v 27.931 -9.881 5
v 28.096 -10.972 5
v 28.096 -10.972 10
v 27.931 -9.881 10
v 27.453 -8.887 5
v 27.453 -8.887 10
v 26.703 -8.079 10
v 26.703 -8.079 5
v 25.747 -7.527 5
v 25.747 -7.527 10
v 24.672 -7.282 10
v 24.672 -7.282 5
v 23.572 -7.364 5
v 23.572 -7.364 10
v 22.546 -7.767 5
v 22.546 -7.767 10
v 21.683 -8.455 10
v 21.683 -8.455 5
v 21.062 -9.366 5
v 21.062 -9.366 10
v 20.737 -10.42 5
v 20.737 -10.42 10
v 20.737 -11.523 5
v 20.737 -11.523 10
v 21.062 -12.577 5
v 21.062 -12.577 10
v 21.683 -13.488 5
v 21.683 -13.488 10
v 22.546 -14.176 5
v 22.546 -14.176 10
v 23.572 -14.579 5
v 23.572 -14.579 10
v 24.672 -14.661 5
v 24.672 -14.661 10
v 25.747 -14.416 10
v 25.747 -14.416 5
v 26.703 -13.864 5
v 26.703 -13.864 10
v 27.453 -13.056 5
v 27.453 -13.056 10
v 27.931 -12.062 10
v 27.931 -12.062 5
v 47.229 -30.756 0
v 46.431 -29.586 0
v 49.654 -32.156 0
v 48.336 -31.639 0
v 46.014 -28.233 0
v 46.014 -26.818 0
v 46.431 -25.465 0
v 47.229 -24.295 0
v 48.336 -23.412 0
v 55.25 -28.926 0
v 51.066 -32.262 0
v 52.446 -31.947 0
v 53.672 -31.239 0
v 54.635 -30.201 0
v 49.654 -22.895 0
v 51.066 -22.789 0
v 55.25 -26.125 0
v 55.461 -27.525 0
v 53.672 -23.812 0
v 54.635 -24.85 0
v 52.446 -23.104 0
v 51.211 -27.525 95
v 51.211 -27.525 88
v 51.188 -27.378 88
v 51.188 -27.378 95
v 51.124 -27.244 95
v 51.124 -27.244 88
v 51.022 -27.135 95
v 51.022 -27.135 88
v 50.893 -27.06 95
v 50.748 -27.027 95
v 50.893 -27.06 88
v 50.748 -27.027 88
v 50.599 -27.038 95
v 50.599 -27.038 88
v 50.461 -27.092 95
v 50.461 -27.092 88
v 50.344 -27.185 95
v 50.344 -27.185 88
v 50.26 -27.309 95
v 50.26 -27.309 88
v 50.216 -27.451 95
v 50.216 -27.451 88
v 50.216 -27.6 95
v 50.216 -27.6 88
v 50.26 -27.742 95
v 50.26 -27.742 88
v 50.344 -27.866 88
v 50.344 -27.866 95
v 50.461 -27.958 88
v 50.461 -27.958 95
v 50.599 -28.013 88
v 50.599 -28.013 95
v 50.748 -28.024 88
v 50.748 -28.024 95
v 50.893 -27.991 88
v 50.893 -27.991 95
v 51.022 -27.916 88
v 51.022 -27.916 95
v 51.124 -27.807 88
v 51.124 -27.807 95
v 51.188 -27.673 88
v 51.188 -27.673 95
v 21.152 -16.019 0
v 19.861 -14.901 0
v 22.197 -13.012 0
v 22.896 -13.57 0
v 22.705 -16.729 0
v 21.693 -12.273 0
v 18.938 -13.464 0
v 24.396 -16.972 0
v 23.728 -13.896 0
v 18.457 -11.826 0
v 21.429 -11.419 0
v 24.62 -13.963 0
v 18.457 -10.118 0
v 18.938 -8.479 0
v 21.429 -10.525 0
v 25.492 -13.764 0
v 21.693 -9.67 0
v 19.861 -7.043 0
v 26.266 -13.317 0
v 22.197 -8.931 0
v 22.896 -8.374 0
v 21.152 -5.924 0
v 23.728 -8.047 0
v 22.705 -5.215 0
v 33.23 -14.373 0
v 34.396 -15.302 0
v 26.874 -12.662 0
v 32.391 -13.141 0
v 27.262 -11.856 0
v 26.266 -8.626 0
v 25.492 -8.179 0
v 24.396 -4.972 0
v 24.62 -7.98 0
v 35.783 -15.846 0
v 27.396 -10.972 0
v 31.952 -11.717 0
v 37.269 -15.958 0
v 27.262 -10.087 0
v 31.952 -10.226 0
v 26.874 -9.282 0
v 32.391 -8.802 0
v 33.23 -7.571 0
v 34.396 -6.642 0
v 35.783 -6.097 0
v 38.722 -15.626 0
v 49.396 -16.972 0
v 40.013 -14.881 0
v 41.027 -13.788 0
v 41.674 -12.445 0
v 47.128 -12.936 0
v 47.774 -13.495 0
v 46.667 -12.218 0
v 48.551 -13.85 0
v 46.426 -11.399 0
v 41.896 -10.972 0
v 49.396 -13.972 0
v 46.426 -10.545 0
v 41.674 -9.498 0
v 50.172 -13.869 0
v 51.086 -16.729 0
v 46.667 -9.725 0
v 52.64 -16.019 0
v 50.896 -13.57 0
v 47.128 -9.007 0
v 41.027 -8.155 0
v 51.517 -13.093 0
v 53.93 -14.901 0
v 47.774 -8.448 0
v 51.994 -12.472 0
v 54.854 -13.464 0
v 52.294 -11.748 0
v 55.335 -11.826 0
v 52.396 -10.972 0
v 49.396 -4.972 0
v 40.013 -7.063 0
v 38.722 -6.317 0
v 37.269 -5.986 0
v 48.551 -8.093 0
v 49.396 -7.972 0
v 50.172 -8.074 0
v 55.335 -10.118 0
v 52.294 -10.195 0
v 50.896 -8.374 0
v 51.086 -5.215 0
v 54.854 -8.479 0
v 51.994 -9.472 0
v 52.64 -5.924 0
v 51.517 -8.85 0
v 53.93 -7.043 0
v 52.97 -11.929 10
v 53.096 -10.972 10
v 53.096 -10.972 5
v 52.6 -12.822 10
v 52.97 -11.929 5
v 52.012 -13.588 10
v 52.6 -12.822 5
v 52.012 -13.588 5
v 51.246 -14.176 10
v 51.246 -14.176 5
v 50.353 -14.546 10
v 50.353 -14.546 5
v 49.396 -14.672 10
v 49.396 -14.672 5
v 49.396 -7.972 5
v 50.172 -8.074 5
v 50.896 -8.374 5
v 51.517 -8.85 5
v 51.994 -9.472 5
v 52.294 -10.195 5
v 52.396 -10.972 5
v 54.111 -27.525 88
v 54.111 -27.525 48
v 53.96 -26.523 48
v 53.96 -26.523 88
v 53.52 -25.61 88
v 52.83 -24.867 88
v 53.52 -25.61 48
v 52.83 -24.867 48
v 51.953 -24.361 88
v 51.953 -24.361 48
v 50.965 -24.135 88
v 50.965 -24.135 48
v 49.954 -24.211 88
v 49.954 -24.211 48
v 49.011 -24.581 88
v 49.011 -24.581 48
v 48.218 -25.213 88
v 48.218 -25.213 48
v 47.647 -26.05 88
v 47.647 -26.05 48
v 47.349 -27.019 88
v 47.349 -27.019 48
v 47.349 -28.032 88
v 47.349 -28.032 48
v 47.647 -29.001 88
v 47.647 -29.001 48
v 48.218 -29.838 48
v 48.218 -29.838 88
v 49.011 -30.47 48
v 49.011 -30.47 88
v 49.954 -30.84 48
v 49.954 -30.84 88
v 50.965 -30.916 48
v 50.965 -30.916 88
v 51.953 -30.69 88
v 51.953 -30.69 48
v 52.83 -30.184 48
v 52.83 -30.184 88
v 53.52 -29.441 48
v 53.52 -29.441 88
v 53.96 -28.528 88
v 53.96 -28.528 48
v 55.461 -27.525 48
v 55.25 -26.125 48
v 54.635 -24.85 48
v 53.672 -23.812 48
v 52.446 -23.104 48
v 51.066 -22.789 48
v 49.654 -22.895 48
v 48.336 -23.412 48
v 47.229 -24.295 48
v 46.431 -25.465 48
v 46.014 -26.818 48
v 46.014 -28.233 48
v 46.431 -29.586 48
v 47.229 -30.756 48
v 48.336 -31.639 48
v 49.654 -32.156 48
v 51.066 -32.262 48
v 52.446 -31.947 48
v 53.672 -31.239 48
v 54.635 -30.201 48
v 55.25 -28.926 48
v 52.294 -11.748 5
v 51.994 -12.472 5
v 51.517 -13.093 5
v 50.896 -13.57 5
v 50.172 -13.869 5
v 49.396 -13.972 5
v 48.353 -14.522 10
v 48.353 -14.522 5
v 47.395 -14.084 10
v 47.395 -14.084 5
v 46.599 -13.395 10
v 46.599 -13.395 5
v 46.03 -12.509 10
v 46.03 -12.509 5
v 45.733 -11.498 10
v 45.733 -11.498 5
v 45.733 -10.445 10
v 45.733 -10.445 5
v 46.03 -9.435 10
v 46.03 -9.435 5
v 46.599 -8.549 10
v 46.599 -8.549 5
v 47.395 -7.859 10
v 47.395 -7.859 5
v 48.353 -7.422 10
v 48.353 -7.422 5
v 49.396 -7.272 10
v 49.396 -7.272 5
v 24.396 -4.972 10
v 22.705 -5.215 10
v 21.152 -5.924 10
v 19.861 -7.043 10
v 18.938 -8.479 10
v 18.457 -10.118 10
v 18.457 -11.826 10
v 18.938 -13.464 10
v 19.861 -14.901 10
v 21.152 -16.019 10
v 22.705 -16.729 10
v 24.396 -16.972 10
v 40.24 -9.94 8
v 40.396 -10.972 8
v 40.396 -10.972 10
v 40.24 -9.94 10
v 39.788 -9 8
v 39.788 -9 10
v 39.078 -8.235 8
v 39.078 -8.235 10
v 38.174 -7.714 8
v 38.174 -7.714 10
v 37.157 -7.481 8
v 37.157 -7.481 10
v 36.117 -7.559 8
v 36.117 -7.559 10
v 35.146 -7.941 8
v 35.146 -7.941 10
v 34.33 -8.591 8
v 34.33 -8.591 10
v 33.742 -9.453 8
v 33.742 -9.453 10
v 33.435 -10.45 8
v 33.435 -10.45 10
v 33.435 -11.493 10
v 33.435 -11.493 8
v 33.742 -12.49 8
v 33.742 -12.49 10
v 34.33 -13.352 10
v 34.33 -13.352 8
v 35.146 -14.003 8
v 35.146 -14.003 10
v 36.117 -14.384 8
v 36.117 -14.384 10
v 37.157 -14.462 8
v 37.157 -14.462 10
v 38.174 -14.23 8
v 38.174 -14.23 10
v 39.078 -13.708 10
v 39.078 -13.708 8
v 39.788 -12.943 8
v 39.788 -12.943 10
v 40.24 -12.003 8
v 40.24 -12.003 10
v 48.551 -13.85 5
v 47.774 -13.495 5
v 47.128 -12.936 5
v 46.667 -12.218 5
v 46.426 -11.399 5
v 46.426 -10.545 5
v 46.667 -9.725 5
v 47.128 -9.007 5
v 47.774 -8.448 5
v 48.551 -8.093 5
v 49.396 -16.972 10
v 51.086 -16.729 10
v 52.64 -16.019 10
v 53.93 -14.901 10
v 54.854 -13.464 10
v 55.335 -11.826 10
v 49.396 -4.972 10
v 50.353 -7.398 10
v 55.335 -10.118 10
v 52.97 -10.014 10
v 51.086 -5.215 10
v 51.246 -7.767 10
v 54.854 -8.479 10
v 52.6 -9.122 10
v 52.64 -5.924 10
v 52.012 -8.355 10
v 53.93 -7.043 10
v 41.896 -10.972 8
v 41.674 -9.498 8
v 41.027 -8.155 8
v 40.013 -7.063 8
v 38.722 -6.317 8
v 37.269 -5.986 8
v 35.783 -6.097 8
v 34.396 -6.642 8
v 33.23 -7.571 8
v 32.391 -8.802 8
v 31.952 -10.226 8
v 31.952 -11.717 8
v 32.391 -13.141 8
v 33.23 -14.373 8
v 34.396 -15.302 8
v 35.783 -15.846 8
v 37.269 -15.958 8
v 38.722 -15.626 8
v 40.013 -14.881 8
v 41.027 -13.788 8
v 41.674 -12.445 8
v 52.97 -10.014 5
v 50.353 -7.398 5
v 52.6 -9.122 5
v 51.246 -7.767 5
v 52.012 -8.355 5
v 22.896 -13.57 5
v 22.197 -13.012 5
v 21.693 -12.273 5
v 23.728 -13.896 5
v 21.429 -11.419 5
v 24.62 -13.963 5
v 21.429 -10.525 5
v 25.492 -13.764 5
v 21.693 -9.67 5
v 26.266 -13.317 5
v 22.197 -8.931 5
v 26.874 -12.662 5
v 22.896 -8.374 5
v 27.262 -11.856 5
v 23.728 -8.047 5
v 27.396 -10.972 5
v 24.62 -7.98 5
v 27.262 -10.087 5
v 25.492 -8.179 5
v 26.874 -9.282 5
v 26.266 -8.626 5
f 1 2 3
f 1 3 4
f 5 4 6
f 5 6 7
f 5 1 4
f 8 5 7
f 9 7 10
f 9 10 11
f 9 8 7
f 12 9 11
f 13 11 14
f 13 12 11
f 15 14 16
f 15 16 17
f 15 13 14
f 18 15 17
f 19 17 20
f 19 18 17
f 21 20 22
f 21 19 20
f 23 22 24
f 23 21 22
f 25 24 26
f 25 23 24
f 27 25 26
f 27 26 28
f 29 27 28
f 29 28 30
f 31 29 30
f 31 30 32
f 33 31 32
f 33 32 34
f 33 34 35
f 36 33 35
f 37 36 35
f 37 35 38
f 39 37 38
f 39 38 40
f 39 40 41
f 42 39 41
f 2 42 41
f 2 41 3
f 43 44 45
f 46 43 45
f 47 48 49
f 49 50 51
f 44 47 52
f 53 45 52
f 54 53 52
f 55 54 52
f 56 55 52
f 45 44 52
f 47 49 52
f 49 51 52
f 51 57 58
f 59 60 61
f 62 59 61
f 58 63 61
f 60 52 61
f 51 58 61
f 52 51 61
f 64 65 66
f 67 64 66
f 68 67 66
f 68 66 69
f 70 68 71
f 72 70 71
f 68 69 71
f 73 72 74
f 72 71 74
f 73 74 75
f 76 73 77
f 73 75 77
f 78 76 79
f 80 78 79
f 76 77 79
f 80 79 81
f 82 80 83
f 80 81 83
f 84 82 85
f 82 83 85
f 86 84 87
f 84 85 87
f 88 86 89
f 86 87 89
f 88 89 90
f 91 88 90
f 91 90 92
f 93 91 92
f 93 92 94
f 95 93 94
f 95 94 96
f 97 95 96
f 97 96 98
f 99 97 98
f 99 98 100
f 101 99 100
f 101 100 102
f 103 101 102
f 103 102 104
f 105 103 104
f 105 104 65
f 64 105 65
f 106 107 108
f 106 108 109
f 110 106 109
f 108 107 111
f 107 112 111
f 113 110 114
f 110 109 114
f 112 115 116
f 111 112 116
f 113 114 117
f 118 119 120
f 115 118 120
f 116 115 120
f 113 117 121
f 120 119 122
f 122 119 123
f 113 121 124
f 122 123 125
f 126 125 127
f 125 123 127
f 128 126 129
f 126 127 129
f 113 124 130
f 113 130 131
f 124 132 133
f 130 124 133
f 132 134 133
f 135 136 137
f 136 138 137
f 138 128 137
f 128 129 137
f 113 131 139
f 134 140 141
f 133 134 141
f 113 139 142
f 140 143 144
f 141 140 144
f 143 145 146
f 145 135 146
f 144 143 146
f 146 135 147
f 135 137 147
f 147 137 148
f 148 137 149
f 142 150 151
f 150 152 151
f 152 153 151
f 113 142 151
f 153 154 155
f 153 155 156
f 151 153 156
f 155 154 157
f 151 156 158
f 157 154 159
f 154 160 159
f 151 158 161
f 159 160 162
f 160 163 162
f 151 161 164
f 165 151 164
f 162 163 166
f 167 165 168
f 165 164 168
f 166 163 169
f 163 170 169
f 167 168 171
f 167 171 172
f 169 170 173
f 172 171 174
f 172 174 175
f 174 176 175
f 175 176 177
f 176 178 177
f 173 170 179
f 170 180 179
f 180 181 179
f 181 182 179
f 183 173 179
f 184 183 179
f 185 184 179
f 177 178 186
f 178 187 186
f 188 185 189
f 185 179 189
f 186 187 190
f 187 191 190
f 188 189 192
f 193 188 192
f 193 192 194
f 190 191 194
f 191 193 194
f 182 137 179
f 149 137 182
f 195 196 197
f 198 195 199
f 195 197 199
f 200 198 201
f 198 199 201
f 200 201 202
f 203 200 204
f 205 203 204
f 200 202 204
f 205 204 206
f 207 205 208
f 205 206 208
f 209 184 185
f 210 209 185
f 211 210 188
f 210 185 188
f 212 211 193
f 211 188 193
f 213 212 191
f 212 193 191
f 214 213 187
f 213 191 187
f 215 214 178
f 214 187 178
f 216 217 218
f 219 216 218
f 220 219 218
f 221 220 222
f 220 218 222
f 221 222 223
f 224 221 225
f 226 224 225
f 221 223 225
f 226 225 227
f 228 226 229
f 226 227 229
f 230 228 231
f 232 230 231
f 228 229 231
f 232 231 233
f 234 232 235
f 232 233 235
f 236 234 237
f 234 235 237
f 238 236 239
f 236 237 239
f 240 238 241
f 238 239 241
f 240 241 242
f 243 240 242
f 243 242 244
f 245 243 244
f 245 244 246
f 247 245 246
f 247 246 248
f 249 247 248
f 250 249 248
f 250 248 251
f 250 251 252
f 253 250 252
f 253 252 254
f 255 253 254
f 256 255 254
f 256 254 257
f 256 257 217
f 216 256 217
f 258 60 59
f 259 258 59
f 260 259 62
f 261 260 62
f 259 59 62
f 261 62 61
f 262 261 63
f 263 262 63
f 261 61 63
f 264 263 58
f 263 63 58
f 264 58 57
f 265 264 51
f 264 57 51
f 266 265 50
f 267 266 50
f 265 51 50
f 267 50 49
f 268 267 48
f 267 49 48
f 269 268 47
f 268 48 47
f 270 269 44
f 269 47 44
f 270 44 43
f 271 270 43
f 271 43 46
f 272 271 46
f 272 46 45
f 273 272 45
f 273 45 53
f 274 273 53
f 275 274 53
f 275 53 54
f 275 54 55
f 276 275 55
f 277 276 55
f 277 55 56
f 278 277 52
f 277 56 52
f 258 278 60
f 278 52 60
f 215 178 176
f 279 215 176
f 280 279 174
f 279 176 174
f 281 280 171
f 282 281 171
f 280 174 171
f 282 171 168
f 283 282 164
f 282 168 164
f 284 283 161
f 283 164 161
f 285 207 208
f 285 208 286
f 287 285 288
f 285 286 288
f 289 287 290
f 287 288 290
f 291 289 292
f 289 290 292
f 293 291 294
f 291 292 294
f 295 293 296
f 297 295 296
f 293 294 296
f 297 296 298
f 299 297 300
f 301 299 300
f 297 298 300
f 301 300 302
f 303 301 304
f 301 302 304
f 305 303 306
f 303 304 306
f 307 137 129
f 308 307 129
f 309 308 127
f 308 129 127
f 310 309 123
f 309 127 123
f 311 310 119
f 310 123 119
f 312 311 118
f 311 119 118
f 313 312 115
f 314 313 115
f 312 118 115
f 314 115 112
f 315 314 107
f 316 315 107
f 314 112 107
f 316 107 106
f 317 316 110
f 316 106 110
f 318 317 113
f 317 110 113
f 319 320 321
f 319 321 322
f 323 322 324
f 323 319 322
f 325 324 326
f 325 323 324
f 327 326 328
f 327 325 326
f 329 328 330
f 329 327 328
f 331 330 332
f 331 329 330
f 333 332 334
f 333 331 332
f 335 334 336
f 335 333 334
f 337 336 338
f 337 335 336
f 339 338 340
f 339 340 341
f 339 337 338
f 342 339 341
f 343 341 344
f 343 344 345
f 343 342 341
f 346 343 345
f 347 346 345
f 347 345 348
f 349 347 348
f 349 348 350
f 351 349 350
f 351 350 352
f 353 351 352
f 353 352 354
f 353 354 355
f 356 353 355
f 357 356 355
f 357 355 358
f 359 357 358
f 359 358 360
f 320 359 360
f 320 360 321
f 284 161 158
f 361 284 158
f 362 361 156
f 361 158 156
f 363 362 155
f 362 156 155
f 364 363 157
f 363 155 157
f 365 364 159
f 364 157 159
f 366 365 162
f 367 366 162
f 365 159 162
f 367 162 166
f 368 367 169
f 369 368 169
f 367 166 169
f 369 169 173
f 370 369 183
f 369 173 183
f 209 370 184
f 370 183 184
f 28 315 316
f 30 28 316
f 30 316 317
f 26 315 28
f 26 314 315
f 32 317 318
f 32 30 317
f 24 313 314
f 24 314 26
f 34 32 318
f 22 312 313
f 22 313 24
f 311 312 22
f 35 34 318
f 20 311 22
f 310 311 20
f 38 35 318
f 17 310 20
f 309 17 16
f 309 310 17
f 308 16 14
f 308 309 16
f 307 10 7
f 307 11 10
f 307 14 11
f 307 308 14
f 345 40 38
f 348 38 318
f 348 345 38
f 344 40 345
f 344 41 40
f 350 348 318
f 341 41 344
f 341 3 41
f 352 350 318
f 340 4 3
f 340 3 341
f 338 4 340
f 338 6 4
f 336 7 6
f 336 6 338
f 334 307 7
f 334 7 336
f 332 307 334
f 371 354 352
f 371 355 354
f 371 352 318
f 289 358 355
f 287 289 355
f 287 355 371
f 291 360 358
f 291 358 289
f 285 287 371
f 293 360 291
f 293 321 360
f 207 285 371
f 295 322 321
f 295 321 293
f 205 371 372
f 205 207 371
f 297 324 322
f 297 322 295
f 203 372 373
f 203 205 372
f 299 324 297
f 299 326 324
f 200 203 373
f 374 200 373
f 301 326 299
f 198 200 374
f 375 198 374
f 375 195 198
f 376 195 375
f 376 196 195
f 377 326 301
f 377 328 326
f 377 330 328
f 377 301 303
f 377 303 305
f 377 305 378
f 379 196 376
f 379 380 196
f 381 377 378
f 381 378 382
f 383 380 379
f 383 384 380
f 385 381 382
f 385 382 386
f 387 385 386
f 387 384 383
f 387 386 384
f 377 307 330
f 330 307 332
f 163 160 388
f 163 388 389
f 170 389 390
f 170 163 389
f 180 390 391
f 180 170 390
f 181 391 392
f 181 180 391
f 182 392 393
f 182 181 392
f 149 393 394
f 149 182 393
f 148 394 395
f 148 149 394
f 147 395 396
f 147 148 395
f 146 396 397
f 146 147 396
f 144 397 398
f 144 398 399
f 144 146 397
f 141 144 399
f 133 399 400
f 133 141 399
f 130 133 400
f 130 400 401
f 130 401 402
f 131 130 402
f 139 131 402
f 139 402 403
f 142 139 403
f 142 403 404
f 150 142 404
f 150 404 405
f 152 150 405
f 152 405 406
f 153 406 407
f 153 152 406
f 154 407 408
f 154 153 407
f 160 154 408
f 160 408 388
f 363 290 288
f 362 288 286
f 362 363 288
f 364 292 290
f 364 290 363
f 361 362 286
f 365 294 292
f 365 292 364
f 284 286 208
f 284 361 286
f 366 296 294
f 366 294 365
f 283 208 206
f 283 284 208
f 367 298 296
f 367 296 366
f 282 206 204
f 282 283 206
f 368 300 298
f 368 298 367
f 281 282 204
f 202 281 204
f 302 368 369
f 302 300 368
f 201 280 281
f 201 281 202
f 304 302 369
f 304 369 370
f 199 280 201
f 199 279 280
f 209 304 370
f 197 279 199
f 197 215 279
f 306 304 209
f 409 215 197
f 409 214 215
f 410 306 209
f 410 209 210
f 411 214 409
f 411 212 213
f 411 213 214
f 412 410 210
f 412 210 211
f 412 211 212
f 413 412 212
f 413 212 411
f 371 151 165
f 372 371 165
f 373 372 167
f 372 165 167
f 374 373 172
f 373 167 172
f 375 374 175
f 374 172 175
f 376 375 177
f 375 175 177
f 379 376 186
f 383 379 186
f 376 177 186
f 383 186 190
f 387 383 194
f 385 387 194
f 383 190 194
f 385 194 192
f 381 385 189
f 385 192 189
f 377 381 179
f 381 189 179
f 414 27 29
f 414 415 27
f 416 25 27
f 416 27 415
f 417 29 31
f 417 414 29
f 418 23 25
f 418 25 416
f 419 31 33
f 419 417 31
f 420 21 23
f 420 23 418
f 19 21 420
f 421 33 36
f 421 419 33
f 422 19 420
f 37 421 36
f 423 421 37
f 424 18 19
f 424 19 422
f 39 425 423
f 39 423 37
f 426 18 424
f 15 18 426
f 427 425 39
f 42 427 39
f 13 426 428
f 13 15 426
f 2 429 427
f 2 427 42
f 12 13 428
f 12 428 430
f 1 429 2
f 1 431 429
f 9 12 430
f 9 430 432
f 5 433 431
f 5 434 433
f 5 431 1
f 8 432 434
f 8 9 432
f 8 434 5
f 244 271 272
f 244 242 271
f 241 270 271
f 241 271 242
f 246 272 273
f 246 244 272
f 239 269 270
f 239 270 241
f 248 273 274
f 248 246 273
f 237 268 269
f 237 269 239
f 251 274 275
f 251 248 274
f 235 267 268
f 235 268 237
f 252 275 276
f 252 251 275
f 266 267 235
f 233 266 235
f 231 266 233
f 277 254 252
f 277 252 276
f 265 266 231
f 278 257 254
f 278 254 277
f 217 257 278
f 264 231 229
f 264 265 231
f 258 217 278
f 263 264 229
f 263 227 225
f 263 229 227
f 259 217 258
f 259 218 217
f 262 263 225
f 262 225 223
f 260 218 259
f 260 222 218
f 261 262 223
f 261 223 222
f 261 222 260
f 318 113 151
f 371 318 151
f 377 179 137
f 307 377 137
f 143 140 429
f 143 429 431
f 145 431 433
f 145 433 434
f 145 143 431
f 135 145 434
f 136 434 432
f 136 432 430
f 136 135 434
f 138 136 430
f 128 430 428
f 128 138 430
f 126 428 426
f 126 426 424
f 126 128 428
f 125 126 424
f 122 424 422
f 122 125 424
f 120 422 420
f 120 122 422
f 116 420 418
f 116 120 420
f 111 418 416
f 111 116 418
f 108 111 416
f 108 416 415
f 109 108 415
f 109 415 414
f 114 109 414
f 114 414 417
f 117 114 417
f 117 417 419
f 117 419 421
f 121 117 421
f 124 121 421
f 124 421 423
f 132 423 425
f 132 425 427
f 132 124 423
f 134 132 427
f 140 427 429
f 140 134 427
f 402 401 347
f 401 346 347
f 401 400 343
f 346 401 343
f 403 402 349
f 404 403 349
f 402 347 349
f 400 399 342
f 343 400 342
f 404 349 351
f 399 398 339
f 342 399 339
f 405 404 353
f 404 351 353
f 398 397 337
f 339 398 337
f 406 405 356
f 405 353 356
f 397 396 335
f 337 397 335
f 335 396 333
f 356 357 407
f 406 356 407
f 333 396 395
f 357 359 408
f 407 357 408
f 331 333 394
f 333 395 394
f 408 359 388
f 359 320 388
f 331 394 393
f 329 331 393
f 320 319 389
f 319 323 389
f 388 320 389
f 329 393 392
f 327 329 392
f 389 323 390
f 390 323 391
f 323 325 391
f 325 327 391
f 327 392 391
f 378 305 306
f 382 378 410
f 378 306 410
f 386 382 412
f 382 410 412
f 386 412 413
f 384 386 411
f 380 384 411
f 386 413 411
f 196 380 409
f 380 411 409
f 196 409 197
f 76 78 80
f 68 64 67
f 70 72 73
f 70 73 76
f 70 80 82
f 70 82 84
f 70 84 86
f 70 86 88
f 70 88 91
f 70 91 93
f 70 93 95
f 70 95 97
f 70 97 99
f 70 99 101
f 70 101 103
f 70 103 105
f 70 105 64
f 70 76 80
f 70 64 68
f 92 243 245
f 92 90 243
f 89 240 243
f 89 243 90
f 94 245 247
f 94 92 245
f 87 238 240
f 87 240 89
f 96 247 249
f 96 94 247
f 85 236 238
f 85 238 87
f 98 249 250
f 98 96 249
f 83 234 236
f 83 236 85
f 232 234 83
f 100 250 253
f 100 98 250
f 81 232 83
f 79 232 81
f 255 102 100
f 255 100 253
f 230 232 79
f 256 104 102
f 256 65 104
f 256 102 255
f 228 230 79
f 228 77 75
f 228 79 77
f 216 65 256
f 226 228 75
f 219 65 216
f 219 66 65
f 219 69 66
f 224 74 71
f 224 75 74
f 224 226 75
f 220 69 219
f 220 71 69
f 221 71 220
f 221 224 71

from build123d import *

# Parameters (mm, degrees)
F1_R     = 4.75
F1_R_2   = 3.4
F2_DEPTH = 48
F1_R_3   = 0.5
F3_DEPTH = 88
F4_DEPTH = 95
F0_R     = 3.7
F0_R_2   = 3
F5_DEPTH = 5
F0_R_3   = 5
F0_R_4   = 3.5
F6_DEPTH = 10
F7_DEPTH = 8


with BuildPart() as f2:
    # F1 (on Top) → F2 (new body)
    with BuildSketch(Plane.XY):
        with Locations((50.7105737925, -27.5254845619)):
            Circle(F1_R)
        with Locations((50.7105737925, -27.5254845619)):
            Circle(F1_R_2, mode=Mode.SUBTRACT)
    extrude(amount=F2_DEPTH)

    # F1 (on Top) → F3 (join)
    with BuildSketch(Plane.XY):
        with Locations((50.7105737925, -27.5254845619)):
            Circle(F1_R_2)
        with Locations((50.7105737925, -27.5254845619)):
            Circle(F1_R_3, mode=Mode.SUBTRACT)
    extrude(amount=F3_DEPTH)

    # F1 (on Top) → F4 (join)
    with BuildSketch(Plane.XY):
        with Locations((50.7105737925, -27.5254845619)):
            Circle(F1_R_3)
    extrude(amount=F4_DEPTH)


with BuildPart() as f5:
    # F0 (on Top) → F5 (new body)
    with BuildSketch(Plane.XY):
        with Locations((24.3957359344, -10.9716980308)):
            Circle(F0_R)
        with Locations((24.3957359344, -10.9716980308)):
            Circle(F0_R_2, mode=Mode.SUBTRACT)
    extrude(amount=F5_DEPTH)



with BuildPart() as f5b:
    # F0 (on Top) → F5, piece 2 (new body)
    with BuildSketch(Plane.XY):
        with BuildLine():
            Line((49.3957359344, -7.9716980308), (49.3957359344, -7.2716980308))
            ThreePointArc((49.3957359344, -7.2716980308), (45.6957359344, -10.9716980308), (49.3957359344, -14.6716980308))
            Line((49.3957359344, -14.6716980308), (49.3957359344, -13.9716980308))
            ThreePointArc((49.3957359344, -13.9716980308), (46.3957359344, -10.9716980308), (49.3957359344, -7.9716980308))
        make_face()
        with BuildLine():
            ThreePointArc((53.0957359344, -10.9716980308), (52.0120310248, -8.3554029404), (49.3957359344, -7.2716980308))
            Line((49.3957359344, -7.2716980308), (49.3957359344, -7.9716980308))
            ThreePointArc((49.3957359344, -7.9716980308), (51.5170562779, -8.8503776873), (52.3957359344, -10.9716980308))
            ThreePointArc((52.3957359344, -10.9716980308), (51.5170562779, -13.0930183744), (49.3957359344, -13.9716980308))
            Line((49.3957359344, -13.9716980308), (49.3957359344, -14.6716980308))
            ThreePointArc((49.3957359344, -14.6716980308), (52.0120310248, -13.5879931212), (53.0957359344, -10.9716980308))
        make_face()
    extrude(amount=F5_DEPTH)


with BuildPart() as f5_1:
    add(f5.part)

    add(f5b.part)  # F6 merges F5b
    # F0 (on Top) → F6 (join)
    with BuildSketch(Plane.XY):
        with BuildLine():
            Line((36.8957359344, -4.9716980308), (24.3957359344, -4.9716980308))
            ThreePointArc((24.3957359344, -4.9716980308), (18.3957359344, -10.9716980308), (24.3957359344, -16.9716980308))
            Line((24.3957359344, -16.9716980308), (36.8957359344, -16.9716980308))
            Line((36.8957359344, -16.9716980308), (49.3957359344, -16.9716980308))
            Line((49.3957359344, -16.9716980308), (49.3957359344, -14.6716980308))
            ThreePointArc((49.3957359344, -14.6716980308), (45.6957359344, -10.9716980308), (49.3957359344, -7.2716980308))
            Line((49.3957359344, -7.2716980308), (49.3957359344, -4.9716980308))
            Line((49.3957359344, -4.9716980308), (36.8957359344, -4.9716980308))
        make_face()
        with Locations((24.3957359344, -10.9716980308)):
            Circle(F0_R, mode=Mode.SUBTRACT)
        with Locations((36.8957359344, -10.9716980308)):
            Circle(F0_R_3, mode=Mode.SUBTRACT)
        with BuildLine():
            ThreePointArc((49.3957359344, -16.9716980308), (55.3957359344, -10.9716980308), (49.3957359344, -4.9716980308))
            Line((49.3957359344, -4.9716980308), (49.3957359344, -7.2716980308))
            ThreePointArc((49.3957359344, -7.2716980308), (52.0120310248, -8.3554029404), (53.0957359344, -10.9716980308))
            ThreePointArc((53.0957359344, -10.9716980308), (52.0120310248, -13.5879931212), (49.3957359344, -14.6716980308))
            Line((49.3957359344, -14.6716980308), (49.3957359344, -16.9716980308))
        make_face()
        with Locations((36.8957359344, -10.9716980308)):
            Circle(F0_R_3)
        with Locations((36.8957359344, -10.9716980308)):
            Circle(F0_R_4, mode=Mode.SUBTRACT)
    extrude(amount=F6_DEPTH)

    # F0 (on Top) → F7 (cut)
    with BuildSketch(Plane.XY):
        with Locations((36.8957359344, -10.9716980308)):
            Circle(F0_R_3)
        with Locations((36.8957359344, -10.9716980308)):
            Circle(F0_R_4, mode=Mode.SUBTRACT)
    extrude(amount=F7_DEPTH, mode=Mode.SUBTRACT)


solid = Compound([f2.part, f5_1.part])
